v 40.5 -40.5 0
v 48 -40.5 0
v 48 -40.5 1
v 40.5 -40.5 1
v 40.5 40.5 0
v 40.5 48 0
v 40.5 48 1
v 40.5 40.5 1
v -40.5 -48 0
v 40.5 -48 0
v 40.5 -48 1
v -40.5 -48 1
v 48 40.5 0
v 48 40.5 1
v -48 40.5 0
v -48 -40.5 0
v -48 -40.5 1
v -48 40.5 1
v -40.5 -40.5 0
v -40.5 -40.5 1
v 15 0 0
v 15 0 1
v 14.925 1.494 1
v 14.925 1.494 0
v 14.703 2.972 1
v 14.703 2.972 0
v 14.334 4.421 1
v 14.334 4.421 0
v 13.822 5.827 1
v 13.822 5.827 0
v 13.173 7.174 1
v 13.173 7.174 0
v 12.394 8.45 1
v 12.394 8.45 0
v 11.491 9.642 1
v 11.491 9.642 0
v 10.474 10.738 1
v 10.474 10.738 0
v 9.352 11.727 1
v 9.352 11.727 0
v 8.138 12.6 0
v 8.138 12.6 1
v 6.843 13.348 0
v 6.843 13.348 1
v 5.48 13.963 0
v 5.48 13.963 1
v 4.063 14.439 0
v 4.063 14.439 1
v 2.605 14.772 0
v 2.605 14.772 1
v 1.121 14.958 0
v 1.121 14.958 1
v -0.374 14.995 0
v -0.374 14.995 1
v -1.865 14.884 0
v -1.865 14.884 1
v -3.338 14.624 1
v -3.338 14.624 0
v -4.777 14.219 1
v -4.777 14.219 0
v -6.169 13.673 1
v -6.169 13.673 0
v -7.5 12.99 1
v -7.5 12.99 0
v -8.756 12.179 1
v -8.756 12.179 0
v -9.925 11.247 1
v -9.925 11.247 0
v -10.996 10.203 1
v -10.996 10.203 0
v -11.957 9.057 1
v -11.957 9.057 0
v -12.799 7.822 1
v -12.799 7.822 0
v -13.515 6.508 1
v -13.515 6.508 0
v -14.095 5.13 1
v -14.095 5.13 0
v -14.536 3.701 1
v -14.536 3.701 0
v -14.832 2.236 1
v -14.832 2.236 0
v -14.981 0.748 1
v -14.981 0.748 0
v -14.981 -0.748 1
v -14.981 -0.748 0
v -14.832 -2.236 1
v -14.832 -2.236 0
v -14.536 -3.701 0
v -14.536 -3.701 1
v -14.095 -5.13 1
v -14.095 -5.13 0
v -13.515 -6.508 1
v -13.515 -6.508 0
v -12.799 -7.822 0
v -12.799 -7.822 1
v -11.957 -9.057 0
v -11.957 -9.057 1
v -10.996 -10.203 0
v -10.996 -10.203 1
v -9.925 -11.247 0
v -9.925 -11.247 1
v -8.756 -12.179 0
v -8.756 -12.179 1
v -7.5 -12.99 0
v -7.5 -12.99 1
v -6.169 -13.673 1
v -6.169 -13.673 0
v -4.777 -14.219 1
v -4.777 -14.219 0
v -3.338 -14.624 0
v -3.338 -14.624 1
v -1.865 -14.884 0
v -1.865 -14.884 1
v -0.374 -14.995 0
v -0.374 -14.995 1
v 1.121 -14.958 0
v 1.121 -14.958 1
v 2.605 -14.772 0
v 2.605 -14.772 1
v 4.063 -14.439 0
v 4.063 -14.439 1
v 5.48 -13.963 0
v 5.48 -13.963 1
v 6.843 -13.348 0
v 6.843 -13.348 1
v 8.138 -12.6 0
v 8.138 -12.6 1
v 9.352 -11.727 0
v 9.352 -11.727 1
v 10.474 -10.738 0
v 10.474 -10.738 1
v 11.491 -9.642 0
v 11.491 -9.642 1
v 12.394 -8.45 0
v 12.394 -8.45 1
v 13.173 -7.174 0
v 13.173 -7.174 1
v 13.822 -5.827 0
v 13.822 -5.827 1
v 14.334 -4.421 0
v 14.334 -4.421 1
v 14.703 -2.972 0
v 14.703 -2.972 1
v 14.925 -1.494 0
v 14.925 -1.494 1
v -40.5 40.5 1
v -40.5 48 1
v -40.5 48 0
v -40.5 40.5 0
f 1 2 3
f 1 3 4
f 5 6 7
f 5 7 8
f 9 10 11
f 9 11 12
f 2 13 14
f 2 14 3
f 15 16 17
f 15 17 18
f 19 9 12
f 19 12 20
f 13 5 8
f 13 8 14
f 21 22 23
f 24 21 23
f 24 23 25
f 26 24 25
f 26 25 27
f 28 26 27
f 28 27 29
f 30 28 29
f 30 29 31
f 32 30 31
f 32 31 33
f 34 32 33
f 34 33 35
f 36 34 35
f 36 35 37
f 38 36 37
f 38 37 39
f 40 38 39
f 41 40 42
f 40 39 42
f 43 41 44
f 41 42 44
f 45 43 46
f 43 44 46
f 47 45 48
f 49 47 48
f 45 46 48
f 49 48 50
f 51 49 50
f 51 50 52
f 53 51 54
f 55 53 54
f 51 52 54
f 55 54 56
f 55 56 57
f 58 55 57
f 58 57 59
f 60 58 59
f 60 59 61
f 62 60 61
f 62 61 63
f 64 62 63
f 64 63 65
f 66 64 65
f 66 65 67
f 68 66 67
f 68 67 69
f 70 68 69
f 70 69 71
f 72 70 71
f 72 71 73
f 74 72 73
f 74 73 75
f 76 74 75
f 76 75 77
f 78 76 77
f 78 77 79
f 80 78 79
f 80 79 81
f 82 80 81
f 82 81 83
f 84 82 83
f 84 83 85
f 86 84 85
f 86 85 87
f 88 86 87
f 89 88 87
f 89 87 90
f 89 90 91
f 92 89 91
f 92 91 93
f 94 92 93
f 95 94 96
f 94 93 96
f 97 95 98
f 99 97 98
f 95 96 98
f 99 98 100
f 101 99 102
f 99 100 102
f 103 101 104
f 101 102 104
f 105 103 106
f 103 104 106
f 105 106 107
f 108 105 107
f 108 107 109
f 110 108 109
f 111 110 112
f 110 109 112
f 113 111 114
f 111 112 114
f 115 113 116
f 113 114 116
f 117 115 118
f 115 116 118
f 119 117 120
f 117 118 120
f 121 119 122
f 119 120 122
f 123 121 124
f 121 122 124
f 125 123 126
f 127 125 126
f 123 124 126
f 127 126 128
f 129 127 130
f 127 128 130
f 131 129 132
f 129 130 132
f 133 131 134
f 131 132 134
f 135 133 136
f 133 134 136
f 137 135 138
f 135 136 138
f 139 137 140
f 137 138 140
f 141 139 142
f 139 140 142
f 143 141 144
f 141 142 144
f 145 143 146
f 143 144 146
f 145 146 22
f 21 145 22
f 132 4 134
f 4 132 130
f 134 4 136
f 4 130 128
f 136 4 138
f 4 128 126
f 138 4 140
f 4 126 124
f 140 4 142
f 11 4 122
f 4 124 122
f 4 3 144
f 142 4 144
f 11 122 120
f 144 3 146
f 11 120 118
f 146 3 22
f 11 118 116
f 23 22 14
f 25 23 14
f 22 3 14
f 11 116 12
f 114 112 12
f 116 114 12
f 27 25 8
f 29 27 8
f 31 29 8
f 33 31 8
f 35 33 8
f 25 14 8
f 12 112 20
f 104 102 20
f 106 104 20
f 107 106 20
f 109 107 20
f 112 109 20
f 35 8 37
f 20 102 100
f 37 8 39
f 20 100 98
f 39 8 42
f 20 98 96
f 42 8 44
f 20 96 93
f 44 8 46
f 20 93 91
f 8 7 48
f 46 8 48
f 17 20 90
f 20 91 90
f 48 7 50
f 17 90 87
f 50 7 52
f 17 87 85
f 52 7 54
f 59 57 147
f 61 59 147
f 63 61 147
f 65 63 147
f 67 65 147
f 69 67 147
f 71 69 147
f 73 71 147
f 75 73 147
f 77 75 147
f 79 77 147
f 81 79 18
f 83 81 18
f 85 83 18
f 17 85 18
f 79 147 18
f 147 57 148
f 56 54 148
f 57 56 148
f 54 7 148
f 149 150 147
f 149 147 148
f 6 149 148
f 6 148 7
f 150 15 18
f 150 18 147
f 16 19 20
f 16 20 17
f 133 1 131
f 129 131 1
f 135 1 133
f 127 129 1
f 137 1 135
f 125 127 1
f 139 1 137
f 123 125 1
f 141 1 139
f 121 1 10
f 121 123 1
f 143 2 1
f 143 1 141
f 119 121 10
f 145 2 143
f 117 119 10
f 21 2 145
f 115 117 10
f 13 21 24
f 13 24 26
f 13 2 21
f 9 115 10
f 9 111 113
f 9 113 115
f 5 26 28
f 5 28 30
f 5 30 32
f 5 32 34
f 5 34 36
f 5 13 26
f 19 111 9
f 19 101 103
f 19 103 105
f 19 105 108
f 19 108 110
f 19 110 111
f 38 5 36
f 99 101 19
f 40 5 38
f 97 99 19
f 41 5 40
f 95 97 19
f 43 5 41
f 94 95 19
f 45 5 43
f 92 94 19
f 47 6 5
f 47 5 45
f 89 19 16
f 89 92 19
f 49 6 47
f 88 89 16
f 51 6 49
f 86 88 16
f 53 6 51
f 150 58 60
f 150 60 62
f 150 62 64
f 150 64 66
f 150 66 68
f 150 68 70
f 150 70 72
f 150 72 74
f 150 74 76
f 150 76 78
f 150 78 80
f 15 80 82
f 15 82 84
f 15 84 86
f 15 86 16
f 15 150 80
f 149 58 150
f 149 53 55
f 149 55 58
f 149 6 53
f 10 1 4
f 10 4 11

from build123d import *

# Parameters (mm, degrees)
BOSS_EXTRUDE1_DEPTH = 1
SKETCH2_R           = 15
CUT_EXTRUDE1_DEPTH  = 10


with BuildPart() as part:
    # Sketch1 → Boss-Extrude1 (new body)
    with BuildSketch(Plane.XY):
        Polygon((-48, 40.5), (-40.5, 40.5), (-40.5, 48), (40.5, 48), (40.5, 40.5), (48, 40.5), (48, -40.5), (40.5, -40.5), (40.5, -48), (-40.5, -48), (-40.5, -40.5), (-48, -40.5), align=None)
    extrude(amount=BOSS_EXTRUDE1_DEPTH)

    # Sketch2 → Cut-Extrude1 (cut)
    with BuildSketch(Plane.XY.offset(1)):
        Circle(SKETCH2_R)
    extrude(amount=-CUT_EXTRUDE1_DEPTH, mode=Mode.SUBTRACT)


solid = part.part
